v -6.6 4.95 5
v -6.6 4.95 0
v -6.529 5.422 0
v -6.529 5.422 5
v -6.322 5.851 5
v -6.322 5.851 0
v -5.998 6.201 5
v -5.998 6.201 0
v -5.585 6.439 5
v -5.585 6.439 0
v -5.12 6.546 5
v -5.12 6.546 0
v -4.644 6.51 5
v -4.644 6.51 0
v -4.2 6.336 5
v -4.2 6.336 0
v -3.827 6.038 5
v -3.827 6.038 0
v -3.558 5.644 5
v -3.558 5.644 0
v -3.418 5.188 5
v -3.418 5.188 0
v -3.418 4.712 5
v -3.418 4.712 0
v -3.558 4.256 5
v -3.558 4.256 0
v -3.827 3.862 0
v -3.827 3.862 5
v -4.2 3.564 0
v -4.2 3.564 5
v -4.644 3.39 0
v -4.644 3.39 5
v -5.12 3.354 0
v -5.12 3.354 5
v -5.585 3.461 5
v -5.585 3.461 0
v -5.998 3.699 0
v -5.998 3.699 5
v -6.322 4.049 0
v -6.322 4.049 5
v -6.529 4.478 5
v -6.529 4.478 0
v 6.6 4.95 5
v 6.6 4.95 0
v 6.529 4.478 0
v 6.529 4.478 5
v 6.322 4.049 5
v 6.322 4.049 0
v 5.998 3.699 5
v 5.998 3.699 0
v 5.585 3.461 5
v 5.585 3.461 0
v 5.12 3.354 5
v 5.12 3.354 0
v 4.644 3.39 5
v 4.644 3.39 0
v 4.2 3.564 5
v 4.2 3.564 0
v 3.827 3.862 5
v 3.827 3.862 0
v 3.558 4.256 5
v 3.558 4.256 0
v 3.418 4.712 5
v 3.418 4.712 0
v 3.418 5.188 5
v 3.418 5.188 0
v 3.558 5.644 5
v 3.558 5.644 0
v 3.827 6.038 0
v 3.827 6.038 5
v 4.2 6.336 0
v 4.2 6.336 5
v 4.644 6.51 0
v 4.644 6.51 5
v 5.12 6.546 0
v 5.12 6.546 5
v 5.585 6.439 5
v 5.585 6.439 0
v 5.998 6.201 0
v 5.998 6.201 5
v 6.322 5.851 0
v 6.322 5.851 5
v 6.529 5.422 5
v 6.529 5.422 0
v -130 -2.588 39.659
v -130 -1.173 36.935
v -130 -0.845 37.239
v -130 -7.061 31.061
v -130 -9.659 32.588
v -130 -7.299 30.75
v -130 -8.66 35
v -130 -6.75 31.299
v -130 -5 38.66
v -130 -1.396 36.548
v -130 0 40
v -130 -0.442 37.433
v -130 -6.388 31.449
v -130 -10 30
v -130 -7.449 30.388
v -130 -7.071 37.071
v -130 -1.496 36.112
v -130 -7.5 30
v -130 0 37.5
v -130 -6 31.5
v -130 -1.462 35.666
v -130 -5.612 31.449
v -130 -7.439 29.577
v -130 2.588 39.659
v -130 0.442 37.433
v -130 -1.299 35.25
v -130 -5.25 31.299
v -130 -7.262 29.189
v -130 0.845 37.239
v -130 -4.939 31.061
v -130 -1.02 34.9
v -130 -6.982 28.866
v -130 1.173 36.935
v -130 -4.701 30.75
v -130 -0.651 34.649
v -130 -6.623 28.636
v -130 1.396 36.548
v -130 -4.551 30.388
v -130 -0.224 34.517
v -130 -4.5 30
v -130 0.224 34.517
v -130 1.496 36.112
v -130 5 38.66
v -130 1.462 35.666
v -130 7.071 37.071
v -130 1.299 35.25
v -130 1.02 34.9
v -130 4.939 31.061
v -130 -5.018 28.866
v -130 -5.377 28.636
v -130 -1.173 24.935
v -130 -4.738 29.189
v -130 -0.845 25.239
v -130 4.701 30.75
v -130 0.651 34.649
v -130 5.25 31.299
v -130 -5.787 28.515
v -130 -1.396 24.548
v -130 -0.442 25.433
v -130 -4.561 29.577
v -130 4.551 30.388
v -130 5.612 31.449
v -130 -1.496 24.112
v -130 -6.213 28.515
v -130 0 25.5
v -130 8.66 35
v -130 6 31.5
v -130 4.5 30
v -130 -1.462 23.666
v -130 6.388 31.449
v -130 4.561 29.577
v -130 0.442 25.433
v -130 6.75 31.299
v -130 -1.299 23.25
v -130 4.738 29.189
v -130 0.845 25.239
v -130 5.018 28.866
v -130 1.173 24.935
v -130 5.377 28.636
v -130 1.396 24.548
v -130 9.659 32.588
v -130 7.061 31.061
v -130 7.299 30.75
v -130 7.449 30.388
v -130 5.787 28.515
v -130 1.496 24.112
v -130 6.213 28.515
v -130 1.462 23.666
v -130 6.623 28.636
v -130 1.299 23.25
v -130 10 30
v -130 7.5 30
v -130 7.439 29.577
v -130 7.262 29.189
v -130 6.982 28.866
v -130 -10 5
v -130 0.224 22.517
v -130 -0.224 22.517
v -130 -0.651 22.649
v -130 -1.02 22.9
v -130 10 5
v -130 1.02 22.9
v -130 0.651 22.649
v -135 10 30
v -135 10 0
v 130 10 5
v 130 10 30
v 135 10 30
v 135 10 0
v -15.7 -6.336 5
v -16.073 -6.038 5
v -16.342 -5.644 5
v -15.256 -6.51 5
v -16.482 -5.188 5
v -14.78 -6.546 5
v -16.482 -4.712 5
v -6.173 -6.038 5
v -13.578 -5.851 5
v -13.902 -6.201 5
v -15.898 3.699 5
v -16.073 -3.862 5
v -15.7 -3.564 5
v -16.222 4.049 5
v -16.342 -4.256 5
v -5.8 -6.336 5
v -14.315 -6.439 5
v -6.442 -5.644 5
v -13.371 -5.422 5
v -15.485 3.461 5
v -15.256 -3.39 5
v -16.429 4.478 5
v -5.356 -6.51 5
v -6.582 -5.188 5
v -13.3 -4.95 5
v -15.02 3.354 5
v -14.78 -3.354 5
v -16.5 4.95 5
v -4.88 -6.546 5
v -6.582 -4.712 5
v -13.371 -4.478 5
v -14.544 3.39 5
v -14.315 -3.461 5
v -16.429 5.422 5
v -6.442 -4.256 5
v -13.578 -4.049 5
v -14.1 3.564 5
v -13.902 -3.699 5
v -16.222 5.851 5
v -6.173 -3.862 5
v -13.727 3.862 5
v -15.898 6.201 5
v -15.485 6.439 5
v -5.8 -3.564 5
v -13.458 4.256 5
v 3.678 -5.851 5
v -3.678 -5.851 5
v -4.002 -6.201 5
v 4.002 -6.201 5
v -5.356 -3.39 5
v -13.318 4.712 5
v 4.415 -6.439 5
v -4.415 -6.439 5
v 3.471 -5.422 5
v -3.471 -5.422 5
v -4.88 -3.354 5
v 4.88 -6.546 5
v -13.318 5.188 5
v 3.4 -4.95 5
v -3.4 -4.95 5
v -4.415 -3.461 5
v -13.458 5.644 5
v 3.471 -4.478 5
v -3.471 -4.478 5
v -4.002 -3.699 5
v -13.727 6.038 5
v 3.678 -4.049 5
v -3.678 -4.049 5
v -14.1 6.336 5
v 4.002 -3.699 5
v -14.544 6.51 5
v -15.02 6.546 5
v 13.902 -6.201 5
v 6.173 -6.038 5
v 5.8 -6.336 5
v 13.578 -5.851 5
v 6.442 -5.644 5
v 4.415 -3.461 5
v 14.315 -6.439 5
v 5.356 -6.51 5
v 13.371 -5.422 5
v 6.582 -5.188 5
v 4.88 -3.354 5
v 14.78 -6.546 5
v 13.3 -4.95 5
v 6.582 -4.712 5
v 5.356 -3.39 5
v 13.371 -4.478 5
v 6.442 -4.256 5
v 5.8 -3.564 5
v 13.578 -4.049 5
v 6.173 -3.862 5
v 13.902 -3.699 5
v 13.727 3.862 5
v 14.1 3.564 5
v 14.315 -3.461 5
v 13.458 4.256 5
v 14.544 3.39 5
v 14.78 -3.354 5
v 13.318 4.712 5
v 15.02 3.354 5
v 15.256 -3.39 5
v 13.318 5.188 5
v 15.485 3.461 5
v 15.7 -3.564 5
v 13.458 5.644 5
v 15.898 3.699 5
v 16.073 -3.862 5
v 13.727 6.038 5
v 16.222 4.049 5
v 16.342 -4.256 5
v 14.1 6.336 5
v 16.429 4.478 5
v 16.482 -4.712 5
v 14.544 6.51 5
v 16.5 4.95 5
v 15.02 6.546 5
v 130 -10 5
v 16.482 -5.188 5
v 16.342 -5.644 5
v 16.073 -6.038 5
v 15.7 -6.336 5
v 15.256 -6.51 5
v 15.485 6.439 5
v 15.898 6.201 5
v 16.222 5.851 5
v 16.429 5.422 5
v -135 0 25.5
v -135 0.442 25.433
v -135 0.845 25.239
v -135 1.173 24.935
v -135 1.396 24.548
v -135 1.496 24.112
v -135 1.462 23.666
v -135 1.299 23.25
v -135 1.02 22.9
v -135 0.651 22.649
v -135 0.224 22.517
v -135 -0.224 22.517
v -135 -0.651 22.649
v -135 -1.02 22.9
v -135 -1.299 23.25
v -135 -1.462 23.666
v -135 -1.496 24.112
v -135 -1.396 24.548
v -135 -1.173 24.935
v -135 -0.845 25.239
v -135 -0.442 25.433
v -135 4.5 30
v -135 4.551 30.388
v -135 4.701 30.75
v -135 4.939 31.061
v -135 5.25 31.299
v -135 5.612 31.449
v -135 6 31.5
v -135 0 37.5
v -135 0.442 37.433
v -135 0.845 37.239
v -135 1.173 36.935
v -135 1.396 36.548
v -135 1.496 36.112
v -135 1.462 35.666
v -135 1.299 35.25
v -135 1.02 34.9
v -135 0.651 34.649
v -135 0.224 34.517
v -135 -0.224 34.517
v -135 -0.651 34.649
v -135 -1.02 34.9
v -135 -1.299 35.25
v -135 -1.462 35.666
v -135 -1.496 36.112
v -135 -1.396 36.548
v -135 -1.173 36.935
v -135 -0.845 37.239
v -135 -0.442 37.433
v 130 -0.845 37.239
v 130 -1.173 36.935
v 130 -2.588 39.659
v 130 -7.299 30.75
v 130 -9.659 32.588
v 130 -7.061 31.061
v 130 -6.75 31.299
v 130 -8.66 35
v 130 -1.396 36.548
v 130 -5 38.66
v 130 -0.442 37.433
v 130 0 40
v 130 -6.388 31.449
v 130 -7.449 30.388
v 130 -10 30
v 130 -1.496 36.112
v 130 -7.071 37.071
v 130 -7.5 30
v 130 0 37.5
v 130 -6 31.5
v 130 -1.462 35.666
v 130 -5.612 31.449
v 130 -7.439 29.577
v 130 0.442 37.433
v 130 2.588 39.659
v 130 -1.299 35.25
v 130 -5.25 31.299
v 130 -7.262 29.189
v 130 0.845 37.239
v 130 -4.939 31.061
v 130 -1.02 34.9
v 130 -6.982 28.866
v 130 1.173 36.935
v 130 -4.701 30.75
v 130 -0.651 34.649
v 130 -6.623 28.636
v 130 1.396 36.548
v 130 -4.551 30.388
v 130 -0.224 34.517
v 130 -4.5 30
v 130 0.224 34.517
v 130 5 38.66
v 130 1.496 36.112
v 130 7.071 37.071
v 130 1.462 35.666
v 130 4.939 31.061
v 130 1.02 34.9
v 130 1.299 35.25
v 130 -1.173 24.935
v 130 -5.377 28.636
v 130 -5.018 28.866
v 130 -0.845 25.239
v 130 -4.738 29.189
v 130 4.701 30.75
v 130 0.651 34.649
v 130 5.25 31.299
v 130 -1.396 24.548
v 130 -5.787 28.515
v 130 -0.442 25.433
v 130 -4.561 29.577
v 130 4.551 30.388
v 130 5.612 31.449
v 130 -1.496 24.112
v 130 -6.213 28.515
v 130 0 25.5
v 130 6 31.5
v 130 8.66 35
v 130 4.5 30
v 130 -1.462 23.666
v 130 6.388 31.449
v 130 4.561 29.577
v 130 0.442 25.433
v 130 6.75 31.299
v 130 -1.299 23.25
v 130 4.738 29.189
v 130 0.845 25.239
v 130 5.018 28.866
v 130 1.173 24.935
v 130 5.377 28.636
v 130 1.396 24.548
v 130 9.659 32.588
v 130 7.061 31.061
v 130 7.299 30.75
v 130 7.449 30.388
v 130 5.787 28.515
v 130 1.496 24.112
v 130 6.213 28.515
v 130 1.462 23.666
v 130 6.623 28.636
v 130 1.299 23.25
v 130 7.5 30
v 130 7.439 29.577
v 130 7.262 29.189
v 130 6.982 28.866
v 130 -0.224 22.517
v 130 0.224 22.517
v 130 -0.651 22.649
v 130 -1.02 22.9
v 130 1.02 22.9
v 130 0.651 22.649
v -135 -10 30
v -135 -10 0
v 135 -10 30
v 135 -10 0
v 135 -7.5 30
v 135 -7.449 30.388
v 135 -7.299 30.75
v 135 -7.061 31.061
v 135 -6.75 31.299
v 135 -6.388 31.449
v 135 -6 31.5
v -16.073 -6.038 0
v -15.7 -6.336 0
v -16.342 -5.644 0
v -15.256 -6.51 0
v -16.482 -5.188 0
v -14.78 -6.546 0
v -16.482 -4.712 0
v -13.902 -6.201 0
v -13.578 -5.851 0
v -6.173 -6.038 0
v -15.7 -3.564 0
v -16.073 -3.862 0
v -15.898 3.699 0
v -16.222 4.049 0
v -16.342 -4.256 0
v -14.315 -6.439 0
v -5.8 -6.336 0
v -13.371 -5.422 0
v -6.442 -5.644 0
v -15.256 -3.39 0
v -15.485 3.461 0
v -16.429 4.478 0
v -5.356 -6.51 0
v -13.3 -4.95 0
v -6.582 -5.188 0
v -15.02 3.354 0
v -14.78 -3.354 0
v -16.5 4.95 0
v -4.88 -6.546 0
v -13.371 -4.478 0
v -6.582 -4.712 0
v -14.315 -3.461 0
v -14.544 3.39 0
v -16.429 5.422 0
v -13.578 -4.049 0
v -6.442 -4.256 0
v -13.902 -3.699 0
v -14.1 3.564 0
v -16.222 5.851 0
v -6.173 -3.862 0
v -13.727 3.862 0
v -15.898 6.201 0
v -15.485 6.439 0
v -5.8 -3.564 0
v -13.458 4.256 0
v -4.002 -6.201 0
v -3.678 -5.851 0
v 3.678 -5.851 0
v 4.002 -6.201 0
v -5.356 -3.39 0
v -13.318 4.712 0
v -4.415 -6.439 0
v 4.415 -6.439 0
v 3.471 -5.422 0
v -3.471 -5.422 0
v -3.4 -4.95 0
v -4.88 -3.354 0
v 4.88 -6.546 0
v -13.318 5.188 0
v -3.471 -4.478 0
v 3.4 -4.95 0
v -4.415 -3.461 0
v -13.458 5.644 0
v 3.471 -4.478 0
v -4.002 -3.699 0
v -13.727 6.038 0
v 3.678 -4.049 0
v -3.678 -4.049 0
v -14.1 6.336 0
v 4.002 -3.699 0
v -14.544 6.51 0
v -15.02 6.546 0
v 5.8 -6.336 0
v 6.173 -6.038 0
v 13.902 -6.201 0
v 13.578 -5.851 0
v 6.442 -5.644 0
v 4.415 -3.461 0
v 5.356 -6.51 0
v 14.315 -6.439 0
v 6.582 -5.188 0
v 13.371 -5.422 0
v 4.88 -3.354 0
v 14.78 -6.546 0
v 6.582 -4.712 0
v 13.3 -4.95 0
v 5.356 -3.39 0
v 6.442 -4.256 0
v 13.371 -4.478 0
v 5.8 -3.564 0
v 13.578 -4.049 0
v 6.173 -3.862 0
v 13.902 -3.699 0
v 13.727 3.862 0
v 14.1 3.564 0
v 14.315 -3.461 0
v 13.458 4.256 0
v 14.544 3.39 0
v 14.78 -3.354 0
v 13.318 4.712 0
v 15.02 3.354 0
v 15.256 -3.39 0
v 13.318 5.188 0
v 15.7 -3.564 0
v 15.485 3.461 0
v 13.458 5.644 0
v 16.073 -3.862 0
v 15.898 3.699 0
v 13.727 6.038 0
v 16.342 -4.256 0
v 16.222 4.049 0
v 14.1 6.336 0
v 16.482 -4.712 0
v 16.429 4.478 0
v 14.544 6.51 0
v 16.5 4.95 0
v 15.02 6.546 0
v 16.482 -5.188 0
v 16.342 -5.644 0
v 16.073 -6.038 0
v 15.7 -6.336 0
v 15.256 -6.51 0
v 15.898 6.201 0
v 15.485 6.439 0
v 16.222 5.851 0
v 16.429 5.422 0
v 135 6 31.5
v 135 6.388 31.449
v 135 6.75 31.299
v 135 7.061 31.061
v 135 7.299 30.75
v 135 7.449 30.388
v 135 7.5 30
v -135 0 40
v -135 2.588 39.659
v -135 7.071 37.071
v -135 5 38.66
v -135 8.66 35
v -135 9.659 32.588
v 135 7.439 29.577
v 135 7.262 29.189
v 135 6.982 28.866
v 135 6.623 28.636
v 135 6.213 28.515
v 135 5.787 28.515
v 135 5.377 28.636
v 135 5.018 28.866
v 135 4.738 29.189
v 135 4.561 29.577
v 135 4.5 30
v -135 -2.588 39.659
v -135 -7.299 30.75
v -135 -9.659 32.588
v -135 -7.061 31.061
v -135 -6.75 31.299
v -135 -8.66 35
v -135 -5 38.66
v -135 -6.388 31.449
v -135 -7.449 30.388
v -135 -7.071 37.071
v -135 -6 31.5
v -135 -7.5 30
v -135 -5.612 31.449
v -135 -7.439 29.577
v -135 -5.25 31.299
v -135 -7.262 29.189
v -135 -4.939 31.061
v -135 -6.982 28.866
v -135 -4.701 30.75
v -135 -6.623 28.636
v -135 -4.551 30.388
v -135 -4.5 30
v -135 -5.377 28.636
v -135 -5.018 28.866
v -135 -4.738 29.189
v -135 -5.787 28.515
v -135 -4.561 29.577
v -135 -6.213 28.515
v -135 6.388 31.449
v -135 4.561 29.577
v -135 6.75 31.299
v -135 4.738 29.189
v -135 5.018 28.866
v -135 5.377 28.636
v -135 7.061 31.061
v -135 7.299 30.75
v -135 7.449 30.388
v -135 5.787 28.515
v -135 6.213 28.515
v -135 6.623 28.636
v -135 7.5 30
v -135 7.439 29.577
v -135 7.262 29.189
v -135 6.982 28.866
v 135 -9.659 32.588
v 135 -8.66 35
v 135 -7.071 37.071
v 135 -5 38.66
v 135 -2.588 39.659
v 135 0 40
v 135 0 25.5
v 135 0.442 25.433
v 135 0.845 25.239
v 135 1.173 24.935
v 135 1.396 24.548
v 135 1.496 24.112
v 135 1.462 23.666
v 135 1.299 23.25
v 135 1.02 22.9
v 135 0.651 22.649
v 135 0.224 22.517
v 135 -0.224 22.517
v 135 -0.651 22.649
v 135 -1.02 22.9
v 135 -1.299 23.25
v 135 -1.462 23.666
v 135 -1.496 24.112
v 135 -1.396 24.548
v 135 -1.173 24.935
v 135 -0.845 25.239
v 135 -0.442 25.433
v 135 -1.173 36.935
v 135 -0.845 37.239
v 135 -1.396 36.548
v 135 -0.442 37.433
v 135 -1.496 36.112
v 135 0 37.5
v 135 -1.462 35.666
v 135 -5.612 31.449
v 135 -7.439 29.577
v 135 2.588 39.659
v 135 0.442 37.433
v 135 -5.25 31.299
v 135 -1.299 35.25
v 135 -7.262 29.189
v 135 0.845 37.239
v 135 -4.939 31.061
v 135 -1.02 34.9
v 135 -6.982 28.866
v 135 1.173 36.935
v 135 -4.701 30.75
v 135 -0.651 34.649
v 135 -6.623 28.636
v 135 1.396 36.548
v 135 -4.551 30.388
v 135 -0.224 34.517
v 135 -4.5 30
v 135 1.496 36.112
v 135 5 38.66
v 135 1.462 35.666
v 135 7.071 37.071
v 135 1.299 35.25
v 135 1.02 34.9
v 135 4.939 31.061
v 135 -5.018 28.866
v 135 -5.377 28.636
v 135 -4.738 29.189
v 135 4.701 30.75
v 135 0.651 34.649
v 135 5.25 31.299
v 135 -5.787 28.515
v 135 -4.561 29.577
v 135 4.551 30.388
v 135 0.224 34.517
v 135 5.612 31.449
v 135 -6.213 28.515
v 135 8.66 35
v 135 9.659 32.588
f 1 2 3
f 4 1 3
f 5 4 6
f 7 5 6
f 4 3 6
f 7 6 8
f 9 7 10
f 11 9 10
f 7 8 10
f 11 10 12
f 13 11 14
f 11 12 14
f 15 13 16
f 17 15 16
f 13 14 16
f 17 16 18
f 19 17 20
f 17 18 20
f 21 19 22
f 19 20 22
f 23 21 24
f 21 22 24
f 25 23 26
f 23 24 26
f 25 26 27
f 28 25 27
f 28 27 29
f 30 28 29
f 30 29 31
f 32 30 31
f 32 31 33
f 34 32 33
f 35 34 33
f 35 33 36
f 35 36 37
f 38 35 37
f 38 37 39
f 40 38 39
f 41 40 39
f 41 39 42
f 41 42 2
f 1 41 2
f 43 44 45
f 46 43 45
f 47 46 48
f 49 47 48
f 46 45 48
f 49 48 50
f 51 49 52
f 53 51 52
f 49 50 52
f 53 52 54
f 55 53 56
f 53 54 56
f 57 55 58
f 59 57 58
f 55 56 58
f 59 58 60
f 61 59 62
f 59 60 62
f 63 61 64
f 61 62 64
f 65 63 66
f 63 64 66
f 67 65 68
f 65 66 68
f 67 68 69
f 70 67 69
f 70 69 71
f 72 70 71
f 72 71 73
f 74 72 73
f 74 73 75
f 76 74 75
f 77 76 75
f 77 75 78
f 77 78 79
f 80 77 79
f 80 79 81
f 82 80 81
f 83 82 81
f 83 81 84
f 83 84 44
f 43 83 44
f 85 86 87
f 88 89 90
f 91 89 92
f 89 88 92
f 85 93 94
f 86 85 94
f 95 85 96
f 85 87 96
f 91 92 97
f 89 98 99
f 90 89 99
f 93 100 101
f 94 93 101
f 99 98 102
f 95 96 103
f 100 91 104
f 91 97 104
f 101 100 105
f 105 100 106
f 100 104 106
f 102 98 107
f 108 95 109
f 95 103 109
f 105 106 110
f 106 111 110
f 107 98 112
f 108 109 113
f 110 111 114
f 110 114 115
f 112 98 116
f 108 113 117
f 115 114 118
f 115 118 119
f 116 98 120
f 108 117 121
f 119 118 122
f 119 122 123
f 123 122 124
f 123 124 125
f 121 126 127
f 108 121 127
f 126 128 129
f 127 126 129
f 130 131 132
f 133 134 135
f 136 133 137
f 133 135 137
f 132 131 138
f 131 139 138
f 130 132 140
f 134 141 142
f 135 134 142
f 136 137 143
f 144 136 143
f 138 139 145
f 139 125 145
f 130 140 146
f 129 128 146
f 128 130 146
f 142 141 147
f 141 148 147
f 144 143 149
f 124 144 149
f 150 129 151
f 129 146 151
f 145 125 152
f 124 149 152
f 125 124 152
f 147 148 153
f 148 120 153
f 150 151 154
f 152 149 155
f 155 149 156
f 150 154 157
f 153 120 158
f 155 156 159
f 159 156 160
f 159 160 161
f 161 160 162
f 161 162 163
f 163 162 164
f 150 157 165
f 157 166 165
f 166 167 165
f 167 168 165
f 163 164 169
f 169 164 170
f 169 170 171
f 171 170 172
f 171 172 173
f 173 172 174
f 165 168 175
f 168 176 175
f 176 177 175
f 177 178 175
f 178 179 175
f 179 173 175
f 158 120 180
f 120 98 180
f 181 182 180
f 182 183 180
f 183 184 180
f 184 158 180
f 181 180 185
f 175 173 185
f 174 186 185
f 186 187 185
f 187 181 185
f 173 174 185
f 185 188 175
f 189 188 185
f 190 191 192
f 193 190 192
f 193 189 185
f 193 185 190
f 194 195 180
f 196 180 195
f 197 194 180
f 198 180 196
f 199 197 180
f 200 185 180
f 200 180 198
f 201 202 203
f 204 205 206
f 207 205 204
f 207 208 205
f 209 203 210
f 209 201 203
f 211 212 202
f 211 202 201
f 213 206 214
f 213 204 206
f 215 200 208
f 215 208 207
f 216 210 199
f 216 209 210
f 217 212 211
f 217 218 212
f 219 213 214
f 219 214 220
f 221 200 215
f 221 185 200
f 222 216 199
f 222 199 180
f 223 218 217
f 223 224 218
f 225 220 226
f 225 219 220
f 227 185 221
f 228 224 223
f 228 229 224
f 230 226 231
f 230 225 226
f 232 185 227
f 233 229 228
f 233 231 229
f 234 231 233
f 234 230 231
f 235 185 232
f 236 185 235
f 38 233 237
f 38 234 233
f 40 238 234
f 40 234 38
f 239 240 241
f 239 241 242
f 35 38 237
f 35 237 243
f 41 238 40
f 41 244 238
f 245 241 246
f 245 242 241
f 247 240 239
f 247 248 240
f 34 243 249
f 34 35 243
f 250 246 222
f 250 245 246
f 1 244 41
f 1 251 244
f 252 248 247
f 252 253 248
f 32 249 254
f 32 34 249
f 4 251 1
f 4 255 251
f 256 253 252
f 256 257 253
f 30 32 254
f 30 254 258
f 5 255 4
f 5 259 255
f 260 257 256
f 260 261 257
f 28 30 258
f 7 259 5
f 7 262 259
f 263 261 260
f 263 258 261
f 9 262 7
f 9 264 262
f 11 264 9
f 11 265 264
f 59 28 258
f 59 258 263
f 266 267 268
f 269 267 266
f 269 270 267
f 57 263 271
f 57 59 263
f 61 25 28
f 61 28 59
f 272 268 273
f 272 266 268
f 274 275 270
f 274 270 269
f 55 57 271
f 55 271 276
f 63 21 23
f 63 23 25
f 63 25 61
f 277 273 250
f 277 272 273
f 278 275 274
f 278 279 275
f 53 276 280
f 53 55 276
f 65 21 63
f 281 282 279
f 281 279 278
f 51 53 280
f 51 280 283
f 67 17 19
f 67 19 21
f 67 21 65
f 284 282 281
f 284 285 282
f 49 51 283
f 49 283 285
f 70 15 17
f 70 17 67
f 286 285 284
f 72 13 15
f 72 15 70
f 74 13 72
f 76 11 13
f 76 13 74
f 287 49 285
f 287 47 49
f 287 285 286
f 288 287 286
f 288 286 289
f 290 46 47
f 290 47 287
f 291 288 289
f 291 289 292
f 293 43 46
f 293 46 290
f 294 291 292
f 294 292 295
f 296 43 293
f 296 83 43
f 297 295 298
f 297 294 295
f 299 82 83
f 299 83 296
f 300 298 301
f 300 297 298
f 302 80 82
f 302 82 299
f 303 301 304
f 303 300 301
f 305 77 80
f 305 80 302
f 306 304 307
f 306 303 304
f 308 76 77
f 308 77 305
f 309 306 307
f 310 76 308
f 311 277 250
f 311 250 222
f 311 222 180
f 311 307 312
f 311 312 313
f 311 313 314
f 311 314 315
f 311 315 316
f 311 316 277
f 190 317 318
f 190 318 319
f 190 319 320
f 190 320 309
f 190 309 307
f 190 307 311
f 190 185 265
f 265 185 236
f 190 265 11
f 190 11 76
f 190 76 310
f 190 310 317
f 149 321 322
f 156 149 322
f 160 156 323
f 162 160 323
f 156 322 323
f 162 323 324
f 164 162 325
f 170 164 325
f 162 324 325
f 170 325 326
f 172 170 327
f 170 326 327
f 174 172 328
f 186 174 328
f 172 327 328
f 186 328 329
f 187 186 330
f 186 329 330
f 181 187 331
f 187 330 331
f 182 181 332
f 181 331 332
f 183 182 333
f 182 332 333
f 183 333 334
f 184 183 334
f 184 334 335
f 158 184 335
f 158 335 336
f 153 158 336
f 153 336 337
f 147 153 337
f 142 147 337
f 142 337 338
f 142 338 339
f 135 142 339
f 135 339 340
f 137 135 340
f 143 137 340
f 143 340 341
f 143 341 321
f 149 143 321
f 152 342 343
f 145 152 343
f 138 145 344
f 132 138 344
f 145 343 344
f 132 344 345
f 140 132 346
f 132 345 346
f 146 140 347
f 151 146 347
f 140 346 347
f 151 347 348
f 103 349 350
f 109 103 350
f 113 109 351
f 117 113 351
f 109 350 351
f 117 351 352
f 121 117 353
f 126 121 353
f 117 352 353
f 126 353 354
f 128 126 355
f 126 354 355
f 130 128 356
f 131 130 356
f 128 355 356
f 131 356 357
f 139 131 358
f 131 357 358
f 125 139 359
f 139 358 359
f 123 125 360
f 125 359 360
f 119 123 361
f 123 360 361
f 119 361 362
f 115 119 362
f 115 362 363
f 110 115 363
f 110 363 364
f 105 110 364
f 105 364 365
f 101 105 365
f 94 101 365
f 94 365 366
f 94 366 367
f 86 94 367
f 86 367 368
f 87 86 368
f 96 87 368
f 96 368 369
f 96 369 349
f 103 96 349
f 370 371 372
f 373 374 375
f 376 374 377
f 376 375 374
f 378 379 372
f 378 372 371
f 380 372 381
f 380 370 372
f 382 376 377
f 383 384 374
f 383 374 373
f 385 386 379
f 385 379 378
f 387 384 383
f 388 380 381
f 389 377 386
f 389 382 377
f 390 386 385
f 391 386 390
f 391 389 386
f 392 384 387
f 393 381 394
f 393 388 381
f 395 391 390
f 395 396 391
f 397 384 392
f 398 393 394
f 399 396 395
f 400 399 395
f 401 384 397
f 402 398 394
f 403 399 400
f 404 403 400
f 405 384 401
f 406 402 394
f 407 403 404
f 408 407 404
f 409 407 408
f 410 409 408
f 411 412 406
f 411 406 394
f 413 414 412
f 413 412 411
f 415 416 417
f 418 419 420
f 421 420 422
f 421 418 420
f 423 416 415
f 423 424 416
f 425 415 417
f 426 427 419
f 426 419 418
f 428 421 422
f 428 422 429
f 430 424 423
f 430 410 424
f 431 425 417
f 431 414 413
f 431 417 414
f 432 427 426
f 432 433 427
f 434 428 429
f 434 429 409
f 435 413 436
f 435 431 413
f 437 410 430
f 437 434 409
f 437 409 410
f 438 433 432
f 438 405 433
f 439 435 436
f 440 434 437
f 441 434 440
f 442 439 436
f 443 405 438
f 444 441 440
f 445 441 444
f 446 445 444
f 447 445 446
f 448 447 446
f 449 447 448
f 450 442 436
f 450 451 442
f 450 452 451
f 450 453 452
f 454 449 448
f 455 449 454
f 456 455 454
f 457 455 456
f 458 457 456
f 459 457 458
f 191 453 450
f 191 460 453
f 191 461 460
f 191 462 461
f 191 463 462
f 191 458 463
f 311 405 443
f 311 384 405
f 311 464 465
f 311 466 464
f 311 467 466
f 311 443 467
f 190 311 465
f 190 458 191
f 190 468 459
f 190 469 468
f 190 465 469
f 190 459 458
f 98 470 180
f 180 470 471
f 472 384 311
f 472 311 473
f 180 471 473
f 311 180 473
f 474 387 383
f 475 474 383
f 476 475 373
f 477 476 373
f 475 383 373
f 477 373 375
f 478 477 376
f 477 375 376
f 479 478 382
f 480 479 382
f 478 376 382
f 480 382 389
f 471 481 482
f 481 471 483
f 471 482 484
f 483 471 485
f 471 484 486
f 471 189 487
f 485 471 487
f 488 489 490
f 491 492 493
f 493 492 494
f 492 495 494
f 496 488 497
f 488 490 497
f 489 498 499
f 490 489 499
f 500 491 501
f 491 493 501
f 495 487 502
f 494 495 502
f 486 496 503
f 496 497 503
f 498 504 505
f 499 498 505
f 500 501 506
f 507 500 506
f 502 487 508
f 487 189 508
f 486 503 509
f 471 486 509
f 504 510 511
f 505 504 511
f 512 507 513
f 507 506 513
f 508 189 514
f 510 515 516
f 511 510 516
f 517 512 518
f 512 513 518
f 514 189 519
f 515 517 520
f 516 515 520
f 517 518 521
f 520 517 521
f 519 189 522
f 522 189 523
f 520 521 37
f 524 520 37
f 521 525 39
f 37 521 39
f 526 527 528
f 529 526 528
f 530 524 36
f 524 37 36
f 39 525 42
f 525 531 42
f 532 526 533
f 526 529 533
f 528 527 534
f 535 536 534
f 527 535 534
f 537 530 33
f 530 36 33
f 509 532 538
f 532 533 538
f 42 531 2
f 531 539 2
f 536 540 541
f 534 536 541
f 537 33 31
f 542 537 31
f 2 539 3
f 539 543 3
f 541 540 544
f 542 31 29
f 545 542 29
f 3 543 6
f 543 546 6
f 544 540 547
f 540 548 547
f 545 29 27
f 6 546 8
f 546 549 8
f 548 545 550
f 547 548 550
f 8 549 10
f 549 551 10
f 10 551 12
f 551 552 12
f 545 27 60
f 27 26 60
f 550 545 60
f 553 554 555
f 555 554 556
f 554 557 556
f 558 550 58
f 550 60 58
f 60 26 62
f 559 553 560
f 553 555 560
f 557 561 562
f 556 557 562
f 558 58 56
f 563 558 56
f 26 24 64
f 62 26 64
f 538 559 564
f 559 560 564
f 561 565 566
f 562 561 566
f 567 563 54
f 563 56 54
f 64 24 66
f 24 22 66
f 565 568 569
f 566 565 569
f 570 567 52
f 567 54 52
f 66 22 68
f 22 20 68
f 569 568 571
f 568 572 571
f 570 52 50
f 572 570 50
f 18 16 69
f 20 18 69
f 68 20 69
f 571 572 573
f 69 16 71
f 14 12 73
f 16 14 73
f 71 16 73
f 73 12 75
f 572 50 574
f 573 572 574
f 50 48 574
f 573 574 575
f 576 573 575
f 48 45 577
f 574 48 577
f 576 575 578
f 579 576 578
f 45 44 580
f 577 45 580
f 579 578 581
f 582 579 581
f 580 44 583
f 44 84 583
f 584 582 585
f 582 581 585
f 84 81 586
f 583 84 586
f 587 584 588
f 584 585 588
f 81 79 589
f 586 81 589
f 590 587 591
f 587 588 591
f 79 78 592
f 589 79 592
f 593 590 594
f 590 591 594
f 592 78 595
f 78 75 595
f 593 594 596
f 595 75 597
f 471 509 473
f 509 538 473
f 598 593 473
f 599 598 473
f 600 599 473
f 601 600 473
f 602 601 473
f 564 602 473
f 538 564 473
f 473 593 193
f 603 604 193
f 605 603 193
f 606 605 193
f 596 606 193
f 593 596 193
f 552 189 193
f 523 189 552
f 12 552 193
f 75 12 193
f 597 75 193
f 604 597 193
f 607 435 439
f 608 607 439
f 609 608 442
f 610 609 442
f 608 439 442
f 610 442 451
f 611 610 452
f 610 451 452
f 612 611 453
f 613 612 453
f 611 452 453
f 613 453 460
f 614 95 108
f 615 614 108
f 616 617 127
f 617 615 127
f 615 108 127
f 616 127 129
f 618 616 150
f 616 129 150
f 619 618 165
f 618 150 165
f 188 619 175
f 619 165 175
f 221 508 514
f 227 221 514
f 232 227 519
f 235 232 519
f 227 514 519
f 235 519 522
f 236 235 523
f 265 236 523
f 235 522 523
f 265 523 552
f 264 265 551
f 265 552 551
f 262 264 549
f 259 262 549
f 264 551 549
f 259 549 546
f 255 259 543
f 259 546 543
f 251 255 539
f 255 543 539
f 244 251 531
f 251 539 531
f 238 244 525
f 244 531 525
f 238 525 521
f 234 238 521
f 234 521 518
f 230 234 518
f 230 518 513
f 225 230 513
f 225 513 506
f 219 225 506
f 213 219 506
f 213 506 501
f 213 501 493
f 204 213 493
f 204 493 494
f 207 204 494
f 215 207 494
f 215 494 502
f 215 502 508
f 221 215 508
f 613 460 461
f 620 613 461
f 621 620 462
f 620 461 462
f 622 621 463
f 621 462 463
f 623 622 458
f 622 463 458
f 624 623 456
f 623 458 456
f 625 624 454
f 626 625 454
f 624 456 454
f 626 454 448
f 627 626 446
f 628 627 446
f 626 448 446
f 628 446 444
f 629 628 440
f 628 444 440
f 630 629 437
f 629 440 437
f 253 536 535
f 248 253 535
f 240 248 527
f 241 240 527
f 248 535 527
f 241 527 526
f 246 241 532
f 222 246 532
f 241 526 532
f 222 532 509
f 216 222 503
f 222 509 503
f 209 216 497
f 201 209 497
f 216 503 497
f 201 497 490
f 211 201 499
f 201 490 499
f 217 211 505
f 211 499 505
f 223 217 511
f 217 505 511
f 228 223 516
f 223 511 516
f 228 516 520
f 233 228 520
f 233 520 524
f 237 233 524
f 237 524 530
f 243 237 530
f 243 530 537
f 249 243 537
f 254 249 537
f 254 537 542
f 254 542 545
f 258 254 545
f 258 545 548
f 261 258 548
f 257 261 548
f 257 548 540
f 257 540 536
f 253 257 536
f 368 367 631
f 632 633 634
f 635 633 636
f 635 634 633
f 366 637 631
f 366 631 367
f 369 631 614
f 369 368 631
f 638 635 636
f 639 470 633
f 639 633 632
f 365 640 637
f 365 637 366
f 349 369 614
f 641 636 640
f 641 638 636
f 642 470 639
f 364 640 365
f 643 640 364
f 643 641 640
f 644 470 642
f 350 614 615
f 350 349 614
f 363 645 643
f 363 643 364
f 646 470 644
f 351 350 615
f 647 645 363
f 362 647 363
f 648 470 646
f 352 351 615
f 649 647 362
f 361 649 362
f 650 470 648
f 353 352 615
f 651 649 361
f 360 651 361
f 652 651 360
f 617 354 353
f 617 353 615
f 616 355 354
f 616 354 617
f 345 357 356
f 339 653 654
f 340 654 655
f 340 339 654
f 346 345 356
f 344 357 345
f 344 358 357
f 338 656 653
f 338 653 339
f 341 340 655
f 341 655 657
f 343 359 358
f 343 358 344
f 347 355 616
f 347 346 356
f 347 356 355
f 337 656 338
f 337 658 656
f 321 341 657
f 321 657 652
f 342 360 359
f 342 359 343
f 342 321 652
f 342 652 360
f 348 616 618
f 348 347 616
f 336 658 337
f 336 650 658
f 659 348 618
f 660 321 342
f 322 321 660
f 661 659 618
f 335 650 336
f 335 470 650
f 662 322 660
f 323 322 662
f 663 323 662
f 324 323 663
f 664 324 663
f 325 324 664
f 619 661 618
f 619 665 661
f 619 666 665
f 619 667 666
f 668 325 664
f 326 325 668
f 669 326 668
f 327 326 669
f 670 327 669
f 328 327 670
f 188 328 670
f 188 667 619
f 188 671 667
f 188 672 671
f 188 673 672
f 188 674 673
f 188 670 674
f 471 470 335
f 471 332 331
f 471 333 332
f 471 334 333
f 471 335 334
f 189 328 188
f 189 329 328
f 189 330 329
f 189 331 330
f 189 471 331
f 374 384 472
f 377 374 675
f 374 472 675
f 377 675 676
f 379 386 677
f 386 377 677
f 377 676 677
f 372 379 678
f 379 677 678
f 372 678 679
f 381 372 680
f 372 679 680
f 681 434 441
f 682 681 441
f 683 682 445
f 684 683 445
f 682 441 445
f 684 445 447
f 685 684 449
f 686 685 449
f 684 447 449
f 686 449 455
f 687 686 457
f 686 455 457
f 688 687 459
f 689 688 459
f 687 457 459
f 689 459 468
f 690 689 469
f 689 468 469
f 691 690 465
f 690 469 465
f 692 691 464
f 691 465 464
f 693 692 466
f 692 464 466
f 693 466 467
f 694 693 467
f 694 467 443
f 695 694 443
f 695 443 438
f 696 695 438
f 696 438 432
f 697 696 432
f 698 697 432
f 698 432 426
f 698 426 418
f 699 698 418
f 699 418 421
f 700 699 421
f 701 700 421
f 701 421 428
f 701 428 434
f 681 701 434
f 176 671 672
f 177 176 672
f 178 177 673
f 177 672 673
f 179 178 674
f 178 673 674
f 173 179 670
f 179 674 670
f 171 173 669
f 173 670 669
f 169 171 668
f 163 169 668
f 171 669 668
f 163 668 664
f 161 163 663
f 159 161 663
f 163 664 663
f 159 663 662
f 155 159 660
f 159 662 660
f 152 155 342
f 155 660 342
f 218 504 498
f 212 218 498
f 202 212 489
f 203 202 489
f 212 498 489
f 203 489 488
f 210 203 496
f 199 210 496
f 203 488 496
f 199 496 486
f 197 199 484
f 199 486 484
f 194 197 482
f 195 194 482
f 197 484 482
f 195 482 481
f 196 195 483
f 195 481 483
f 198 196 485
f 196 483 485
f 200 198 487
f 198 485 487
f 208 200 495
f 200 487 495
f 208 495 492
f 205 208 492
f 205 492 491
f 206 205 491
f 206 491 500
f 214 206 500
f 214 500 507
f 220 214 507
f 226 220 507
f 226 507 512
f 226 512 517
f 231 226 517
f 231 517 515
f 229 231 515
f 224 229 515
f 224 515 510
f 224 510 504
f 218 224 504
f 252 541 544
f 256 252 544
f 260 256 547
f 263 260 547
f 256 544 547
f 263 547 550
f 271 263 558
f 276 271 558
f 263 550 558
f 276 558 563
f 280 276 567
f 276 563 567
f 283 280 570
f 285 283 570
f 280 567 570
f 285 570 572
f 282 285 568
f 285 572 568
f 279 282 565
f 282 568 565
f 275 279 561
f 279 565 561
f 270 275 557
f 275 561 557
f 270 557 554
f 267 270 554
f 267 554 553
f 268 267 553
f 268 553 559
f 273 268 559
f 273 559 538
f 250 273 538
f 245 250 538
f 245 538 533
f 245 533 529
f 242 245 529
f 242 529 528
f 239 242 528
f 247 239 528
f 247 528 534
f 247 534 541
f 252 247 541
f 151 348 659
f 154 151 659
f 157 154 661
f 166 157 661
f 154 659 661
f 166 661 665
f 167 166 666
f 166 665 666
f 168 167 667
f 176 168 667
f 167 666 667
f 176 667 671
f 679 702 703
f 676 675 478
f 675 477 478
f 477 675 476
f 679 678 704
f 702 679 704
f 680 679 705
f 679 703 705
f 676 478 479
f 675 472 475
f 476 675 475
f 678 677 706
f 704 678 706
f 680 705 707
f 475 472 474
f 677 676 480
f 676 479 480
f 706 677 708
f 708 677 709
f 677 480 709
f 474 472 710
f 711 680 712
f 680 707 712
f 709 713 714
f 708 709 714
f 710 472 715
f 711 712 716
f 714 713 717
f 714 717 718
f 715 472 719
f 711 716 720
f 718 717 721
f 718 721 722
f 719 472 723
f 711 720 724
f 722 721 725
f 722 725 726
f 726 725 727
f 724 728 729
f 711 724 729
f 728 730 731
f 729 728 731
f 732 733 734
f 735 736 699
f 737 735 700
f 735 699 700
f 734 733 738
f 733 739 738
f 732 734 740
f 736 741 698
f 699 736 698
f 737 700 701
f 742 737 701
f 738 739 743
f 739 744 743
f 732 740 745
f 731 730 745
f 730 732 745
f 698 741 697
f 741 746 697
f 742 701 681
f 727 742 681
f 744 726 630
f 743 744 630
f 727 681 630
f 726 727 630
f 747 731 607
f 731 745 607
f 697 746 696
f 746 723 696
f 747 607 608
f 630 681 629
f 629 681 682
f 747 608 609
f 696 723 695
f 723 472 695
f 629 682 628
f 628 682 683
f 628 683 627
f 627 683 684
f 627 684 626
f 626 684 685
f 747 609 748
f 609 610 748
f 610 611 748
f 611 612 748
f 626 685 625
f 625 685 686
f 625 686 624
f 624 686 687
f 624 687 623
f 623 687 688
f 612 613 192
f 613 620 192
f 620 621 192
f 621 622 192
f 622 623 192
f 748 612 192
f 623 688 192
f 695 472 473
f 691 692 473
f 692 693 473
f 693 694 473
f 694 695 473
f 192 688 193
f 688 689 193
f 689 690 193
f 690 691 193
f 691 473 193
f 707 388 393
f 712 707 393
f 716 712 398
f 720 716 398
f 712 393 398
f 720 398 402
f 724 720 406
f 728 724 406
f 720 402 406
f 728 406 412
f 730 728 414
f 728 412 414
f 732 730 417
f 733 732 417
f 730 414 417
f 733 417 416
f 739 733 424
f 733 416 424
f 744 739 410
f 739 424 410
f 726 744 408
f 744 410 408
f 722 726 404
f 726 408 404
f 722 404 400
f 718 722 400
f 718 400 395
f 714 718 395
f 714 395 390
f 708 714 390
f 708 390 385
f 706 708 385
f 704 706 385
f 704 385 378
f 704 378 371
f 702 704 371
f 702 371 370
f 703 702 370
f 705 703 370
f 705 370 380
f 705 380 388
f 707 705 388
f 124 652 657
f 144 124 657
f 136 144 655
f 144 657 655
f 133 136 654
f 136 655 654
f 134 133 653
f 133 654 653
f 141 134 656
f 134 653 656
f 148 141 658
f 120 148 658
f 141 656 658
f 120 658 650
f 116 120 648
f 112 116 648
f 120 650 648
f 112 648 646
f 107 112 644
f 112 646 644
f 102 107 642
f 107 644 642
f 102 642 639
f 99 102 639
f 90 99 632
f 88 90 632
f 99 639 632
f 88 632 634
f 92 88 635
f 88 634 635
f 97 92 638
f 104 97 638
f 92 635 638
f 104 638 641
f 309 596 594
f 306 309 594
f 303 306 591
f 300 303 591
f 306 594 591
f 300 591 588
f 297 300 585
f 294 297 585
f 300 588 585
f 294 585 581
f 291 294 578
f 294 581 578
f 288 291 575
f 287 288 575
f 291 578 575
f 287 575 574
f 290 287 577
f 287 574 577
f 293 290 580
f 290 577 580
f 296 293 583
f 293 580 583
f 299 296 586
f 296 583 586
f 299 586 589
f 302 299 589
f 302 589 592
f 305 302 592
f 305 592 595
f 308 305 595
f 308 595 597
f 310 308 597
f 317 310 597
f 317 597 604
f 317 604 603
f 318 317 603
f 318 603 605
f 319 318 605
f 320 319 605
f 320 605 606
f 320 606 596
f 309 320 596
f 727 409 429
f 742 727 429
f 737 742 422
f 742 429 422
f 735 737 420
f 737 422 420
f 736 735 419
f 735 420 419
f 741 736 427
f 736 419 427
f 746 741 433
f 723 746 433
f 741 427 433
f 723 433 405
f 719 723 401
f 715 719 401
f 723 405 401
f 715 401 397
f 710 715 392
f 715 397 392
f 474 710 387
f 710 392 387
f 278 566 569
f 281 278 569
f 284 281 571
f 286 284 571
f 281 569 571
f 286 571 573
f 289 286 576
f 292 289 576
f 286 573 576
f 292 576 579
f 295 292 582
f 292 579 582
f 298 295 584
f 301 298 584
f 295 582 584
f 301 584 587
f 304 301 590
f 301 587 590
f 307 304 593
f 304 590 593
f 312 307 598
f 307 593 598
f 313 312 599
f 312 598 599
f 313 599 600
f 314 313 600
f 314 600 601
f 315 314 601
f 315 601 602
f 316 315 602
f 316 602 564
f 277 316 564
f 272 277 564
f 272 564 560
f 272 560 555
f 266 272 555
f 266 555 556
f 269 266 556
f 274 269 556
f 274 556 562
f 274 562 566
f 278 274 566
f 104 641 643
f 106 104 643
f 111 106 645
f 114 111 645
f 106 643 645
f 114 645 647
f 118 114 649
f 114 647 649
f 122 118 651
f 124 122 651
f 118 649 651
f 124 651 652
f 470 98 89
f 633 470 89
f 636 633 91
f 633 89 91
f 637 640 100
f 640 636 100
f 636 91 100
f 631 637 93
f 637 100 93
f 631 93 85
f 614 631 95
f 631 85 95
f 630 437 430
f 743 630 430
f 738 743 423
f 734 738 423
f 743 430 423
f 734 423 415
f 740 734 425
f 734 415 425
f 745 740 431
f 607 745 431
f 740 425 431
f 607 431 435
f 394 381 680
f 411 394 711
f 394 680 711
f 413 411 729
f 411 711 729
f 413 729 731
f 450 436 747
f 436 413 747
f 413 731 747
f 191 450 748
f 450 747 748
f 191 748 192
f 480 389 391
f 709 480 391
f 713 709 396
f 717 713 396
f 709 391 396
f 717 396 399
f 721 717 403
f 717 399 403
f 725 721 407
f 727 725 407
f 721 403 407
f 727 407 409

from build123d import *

# Parameters (mm, degrees)
SKETCH_1_W          = 270
SKETCH_1_H          = 20
EXTRUDE_1_DEPTH     = 5
SKETCH_2_W          = 5
SKETCH_2_H          = 20
EXTRUDE_2_DEPTH     = 35
SKETCH_3_W          = 5
SKETCH_3_H          = 20
EXTRUDE_3_DEPTH     = 35
SKETCH_4_R          = 1.6
CUT_EXTRUDE_1_DEPTH = 35
CUT_EXTRUDE_2_DEPTH = 274.130005675
SKETCH_6_R          = 1.5
CUT_EXTRUDE_3_DEPTH = 274.130005675


with BuildPart() as part:
    # 草图1 → 凸台-拉伸1 (new body)
    with BuildSketch(Plane.XY):
        Rectangle(SKETCH_1_W, SKETCH_1_H)
    extrude(amount=EXTRUDE_1_DEPTH)

    # 草图2 → 凸台-拉伸2 (add)
    with BuildSketch(Plane.XY.offset(5)):
        with Locations((-132.5, 0)):
            Rectangle(SKETCH_2_W, SKETCH_2_H)
    extrude(amount=EXTRUDE_2_DEPTH)

    # 草图3 → 凸台-拉伸3 (add)
    with BuildSketch(Plane.XY.offset(5)):
        with Locations((132.5, 0)):
            Rectangle(SKETCH_3_W, SKETCH_3_H)
    extrude(amount=EXTRUDE_3_DEPTH)

    # 草图4 → 切除-拉伸1 (cut)
    with BuildSketch(Plane(origin=(0, 0, 0), x_dir=(-1, 0, 0), z_dir=(0, 0, -1))):
        with Locations((5, 4.95)):
            Circle(SKETCH_4_R)
        with Locations((14.9, 4.95)):
            Circle(SKETCH_4_R)
        with Locations(Location((-14.9, 4.95, 0), (0, 0, 180))):
            Circle(SKETCH_4_R)
        with Locations(Location((-5, 4.95, 0), (0, 0, 180))):
            Circle(SKETCH_4_R)
        with Locations(Location((14.9, -4.95, 0), (0, 0, 180))):
            Circle(SKETCH_4_R)
        with Locations(Location((5, -4.95, 0), (0, 0, 180))):
            Circle(SKETCH_4_R)
        with Locations((-5, -4.95)):
            Circle(SKETCH_4_R)
        with Locations((-14.9, -4.95)):
            Circle(SKETCH_4_R)
    extrude(amount=-CUT_EXTRUDE_1_DEPTH, mode=Mode.SUBTRACT)

    # 草图5 → 切除-拉伸2 (cut, through all)
    with BuildSketch(Plane(origin=(135, 0, 0), x_dir=(0, 0, -1), z_dir=(1, 0, 0))):
        with BuildLine():
            ThreePointArc((-40, 0), (-37.071067812, 7.071067812), (-30, 10))
            Line((-30, 10), (-40, 10))
            Line((-40, 10), (-40, 0))
        make_face()
        with BuildLine():
            ThreePointArc((-30, -10), (-37.071067812, -7.071067812), (-40, 0))
            Line((-40, 0), (-40, -10))
            Line((-40, -10), (-30, -10))
        make_face()
    extrude(amount=-CUT_EXTRUDE_2_DEPTH, mode=Mode.SUBTRACT)

    # 草图6 → 切除-拉伸3 (cut, through all)
    with BuildSketch(Plane.ZY.offset(135)):
        with BuildLine():
            ThreePointArc((31.5, -6), (31.060660172, -4.939339828), (30, -4.5))
            Line((30, -4.5), (30, -7.5))
            ThreePointArc((30, -7.5), (31.060660172, -7.060660172), (31.5, -6))
        make_face()
        with BuildLine():
            Line((30, -7.5), (30, -4.5))
            ThreePointArc((30, -4.5), (28.5, -6), (30, -7.5))
        make_face()
        with Locations((24, 0)):
            Circle(SKETCH_6_R)
        with Locations((36, 0)):
            Circle(SKETCH_6_R)
        with BuildLine():
            ThreePointArc((31.5, 6), (31.060660172, 7.060660172), (30, 7.5))
            Line((30, 7.5), (30, 4.5))
            ThreePointArc((30, 4.5), (31.060660172, 4.939339828), (31.5, 6))
        make_face()
        with BuildLine():
            Line((30, 4.5), (30, 7.5))
            ThreePointArc((30, 7.5), (28.5, 6), (30, 4.5))
        make_face()
    extrude(amount=-CUT_EXTRUDE_3_DEPTH, mode=Mode.SUBTRACT)


solid = part.part
